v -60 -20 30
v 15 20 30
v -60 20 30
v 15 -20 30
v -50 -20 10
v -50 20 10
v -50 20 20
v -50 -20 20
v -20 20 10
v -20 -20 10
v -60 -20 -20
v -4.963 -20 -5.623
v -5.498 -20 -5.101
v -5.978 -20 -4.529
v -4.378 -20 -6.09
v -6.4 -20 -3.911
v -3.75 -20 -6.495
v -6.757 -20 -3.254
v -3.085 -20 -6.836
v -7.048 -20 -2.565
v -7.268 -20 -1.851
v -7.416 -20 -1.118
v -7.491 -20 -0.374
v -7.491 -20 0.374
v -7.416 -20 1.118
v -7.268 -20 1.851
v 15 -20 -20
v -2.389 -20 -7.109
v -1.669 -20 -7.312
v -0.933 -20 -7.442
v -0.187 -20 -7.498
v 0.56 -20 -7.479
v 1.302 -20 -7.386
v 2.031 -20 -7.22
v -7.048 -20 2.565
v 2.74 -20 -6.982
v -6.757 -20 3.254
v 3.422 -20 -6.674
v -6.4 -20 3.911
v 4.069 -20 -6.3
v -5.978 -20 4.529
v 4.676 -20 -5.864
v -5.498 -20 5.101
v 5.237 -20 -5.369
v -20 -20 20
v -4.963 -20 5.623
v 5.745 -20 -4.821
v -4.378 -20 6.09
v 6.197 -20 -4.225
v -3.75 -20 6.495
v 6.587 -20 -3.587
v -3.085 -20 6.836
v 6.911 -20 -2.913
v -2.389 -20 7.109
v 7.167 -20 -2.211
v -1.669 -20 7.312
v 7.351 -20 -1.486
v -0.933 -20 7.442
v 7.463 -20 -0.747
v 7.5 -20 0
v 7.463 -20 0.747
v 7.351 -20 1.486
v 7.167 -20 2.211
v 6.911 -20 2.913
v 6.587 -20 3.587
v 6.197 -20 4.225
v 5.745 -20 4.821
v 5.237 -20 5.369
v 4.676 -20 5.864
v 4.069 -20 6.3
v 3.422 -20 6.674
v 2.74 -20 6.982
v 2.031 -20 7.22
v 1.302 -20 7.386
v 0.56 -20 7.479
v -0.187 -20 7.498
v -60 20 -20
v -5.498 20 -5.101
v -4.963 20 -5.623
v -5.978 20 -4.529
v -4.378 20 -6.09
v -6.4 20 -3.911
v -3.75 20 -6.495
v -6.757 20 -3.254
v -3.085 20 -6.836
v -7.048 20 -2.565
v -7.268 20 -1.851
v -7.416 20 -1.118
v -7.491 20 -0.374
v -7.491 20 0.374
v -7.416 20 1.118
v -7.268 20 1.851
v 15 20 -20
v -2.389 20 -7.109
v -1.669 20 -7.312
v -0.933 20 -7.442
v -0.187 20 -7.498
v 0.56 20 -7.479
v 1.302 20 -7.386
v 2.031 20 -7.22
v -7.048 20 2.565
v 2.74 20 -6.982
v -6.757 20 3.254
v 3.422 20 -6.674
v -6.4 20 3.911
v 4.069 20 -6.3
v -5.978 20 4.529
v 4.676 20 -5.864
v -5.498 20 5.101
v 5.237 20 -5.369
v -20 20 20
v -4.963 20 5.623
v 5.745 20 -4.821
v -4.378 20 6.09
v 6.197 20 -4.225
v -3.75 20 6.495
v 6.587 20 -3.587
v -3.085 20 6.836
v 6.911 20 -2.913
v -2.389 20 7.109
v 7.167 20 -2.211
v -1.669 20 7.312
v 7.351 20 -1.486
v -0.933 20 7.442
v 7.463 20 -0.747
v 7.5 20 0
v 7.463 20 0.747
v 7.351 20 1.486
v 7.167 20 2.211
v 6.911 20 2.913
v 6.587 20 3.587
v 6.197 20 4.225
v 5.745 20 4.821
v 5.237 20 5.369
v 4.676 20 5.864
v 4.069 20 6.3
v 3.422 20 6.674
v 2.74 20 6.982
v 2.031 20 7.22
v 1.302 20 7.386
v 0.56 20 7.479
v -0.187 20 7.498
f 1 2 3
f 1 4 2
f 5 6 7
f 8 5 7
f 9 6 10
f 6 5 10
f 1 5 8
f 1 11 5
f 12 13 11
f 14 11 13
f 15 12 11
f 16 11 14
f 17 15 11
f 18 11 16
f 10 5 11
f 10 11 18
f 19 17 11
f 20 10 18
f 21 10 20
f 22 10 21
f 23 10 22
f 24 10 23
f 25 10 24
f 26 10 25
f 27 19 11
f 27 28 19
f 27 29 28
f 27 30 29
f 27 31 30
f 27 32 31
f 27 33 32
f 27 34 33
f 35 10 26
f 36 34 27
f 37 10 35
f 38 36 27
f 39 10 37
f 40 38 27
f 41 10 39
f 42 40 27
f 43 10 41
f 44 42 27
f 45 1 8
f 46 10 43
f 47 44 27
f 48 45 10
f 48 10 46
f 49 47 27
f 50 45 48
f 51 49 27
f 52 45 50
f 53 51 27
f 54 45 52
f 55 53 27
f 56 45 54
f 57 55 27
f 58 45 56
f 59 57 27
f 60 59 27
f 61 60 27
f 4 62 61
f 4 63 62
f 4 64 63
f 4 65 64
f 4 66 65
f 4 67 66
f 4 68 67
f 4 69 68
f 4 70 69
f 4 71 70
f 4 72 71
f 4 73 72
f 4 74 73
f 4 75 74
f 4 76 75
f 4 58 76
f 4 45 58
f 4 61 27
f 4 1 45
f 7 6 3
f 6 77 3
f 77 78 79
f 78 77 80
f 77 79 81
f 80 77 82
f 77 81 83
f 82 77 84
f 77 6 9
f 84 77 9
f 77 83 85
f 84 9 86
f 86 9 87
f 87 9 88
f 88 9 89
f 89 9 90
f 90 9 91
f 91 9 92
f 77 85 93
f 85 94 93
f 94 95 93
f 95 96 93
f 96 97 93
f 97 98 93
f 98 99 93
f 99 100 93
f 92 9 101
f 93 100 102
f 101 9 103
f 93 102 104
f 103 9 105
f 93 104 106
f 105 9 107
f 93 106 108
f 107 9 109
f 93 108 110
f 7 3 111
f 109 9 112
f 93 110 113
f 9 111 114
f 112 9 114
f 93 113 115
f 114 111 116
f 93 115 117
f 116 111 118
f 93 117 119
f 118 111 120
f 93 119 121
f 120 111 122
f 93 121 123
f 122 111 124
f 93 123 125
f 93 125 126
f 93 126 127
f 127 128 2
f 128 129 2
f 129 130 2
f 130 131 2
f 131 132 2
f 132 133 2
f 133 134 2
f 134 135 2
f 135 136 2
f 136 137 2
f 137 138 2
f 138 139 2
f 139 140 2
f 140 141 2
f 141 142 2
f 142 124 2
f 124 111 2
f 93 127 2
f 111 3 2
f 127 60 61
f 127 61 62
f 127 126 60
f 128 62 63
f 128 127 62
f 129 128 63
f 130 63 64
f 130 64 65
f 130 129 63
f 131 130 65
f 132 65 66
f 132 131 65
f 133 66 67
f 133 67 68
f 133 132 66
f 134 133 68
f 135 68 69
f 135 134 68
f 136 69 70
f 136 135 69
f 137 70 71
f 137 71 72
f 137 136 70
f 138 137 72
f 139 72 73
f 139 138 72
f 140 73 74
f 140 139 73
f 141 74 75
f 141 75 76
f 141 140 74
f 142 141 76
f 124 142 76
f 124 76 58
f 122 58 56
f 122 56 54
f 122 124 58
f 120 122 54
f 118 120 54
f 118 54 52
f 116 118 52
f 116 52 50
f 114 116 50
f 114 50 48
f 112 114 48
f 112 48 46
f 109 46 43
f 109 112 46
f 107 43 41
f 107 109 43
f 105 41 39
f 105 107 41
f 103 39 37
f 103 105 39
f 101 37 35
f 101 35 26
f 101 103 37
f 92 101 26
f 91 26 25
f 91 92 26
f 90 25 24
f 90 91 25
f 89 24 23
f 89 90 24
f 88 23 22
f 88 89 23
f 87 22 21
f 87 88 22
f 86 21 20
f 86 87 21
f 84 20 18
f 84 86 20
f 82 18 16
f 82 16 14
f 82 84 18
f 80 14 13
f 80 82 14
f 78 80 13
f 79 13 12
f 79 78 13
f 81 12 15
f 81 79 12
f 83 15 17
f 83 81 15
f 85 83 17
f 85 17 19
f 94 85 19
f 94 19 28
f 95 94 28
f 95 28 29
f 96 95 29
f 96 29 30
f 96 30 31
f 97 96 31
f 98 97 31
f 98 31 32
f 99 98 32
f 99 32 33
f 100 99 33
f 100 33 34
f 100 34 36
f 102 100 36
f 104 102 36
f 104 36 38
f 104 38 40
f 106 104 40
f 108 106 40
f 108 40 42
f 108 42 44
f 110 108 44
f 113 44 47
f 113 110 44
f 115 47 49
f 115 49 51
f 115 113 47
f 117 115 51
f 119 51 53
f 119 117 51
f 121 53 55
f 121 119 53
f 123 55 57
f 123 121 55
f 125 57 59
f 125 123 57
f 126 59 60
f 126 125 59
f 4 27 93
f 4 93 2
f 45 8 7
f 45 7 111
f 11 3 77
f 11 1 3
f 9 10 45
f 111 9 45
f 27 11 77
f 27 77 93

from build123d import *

# Parameters (mm, degrees)
F1_R     = 7.5
F1_W     = 30
F1_H     = 10
F2_DEPTH = 20


with BuildPart() as f2:
    # F1 (on face) → F2 (new body, symmetric)
    with BuildSketch(Plane.XZ):
        Polygon((-60, 30), (-60, -20), (0, -20), (15, -20), (15, 0), (15, 30), align=None)
        Circle(F1_R, mode=Mode.SUBTRACT)
        with Locations((-35, 15)):
            Rectangle(F1_W, F1_H, mode=Mode.SUBTRACT)
    extrude(amount=F2_DEPTH, both=True)


solid = f2.part
